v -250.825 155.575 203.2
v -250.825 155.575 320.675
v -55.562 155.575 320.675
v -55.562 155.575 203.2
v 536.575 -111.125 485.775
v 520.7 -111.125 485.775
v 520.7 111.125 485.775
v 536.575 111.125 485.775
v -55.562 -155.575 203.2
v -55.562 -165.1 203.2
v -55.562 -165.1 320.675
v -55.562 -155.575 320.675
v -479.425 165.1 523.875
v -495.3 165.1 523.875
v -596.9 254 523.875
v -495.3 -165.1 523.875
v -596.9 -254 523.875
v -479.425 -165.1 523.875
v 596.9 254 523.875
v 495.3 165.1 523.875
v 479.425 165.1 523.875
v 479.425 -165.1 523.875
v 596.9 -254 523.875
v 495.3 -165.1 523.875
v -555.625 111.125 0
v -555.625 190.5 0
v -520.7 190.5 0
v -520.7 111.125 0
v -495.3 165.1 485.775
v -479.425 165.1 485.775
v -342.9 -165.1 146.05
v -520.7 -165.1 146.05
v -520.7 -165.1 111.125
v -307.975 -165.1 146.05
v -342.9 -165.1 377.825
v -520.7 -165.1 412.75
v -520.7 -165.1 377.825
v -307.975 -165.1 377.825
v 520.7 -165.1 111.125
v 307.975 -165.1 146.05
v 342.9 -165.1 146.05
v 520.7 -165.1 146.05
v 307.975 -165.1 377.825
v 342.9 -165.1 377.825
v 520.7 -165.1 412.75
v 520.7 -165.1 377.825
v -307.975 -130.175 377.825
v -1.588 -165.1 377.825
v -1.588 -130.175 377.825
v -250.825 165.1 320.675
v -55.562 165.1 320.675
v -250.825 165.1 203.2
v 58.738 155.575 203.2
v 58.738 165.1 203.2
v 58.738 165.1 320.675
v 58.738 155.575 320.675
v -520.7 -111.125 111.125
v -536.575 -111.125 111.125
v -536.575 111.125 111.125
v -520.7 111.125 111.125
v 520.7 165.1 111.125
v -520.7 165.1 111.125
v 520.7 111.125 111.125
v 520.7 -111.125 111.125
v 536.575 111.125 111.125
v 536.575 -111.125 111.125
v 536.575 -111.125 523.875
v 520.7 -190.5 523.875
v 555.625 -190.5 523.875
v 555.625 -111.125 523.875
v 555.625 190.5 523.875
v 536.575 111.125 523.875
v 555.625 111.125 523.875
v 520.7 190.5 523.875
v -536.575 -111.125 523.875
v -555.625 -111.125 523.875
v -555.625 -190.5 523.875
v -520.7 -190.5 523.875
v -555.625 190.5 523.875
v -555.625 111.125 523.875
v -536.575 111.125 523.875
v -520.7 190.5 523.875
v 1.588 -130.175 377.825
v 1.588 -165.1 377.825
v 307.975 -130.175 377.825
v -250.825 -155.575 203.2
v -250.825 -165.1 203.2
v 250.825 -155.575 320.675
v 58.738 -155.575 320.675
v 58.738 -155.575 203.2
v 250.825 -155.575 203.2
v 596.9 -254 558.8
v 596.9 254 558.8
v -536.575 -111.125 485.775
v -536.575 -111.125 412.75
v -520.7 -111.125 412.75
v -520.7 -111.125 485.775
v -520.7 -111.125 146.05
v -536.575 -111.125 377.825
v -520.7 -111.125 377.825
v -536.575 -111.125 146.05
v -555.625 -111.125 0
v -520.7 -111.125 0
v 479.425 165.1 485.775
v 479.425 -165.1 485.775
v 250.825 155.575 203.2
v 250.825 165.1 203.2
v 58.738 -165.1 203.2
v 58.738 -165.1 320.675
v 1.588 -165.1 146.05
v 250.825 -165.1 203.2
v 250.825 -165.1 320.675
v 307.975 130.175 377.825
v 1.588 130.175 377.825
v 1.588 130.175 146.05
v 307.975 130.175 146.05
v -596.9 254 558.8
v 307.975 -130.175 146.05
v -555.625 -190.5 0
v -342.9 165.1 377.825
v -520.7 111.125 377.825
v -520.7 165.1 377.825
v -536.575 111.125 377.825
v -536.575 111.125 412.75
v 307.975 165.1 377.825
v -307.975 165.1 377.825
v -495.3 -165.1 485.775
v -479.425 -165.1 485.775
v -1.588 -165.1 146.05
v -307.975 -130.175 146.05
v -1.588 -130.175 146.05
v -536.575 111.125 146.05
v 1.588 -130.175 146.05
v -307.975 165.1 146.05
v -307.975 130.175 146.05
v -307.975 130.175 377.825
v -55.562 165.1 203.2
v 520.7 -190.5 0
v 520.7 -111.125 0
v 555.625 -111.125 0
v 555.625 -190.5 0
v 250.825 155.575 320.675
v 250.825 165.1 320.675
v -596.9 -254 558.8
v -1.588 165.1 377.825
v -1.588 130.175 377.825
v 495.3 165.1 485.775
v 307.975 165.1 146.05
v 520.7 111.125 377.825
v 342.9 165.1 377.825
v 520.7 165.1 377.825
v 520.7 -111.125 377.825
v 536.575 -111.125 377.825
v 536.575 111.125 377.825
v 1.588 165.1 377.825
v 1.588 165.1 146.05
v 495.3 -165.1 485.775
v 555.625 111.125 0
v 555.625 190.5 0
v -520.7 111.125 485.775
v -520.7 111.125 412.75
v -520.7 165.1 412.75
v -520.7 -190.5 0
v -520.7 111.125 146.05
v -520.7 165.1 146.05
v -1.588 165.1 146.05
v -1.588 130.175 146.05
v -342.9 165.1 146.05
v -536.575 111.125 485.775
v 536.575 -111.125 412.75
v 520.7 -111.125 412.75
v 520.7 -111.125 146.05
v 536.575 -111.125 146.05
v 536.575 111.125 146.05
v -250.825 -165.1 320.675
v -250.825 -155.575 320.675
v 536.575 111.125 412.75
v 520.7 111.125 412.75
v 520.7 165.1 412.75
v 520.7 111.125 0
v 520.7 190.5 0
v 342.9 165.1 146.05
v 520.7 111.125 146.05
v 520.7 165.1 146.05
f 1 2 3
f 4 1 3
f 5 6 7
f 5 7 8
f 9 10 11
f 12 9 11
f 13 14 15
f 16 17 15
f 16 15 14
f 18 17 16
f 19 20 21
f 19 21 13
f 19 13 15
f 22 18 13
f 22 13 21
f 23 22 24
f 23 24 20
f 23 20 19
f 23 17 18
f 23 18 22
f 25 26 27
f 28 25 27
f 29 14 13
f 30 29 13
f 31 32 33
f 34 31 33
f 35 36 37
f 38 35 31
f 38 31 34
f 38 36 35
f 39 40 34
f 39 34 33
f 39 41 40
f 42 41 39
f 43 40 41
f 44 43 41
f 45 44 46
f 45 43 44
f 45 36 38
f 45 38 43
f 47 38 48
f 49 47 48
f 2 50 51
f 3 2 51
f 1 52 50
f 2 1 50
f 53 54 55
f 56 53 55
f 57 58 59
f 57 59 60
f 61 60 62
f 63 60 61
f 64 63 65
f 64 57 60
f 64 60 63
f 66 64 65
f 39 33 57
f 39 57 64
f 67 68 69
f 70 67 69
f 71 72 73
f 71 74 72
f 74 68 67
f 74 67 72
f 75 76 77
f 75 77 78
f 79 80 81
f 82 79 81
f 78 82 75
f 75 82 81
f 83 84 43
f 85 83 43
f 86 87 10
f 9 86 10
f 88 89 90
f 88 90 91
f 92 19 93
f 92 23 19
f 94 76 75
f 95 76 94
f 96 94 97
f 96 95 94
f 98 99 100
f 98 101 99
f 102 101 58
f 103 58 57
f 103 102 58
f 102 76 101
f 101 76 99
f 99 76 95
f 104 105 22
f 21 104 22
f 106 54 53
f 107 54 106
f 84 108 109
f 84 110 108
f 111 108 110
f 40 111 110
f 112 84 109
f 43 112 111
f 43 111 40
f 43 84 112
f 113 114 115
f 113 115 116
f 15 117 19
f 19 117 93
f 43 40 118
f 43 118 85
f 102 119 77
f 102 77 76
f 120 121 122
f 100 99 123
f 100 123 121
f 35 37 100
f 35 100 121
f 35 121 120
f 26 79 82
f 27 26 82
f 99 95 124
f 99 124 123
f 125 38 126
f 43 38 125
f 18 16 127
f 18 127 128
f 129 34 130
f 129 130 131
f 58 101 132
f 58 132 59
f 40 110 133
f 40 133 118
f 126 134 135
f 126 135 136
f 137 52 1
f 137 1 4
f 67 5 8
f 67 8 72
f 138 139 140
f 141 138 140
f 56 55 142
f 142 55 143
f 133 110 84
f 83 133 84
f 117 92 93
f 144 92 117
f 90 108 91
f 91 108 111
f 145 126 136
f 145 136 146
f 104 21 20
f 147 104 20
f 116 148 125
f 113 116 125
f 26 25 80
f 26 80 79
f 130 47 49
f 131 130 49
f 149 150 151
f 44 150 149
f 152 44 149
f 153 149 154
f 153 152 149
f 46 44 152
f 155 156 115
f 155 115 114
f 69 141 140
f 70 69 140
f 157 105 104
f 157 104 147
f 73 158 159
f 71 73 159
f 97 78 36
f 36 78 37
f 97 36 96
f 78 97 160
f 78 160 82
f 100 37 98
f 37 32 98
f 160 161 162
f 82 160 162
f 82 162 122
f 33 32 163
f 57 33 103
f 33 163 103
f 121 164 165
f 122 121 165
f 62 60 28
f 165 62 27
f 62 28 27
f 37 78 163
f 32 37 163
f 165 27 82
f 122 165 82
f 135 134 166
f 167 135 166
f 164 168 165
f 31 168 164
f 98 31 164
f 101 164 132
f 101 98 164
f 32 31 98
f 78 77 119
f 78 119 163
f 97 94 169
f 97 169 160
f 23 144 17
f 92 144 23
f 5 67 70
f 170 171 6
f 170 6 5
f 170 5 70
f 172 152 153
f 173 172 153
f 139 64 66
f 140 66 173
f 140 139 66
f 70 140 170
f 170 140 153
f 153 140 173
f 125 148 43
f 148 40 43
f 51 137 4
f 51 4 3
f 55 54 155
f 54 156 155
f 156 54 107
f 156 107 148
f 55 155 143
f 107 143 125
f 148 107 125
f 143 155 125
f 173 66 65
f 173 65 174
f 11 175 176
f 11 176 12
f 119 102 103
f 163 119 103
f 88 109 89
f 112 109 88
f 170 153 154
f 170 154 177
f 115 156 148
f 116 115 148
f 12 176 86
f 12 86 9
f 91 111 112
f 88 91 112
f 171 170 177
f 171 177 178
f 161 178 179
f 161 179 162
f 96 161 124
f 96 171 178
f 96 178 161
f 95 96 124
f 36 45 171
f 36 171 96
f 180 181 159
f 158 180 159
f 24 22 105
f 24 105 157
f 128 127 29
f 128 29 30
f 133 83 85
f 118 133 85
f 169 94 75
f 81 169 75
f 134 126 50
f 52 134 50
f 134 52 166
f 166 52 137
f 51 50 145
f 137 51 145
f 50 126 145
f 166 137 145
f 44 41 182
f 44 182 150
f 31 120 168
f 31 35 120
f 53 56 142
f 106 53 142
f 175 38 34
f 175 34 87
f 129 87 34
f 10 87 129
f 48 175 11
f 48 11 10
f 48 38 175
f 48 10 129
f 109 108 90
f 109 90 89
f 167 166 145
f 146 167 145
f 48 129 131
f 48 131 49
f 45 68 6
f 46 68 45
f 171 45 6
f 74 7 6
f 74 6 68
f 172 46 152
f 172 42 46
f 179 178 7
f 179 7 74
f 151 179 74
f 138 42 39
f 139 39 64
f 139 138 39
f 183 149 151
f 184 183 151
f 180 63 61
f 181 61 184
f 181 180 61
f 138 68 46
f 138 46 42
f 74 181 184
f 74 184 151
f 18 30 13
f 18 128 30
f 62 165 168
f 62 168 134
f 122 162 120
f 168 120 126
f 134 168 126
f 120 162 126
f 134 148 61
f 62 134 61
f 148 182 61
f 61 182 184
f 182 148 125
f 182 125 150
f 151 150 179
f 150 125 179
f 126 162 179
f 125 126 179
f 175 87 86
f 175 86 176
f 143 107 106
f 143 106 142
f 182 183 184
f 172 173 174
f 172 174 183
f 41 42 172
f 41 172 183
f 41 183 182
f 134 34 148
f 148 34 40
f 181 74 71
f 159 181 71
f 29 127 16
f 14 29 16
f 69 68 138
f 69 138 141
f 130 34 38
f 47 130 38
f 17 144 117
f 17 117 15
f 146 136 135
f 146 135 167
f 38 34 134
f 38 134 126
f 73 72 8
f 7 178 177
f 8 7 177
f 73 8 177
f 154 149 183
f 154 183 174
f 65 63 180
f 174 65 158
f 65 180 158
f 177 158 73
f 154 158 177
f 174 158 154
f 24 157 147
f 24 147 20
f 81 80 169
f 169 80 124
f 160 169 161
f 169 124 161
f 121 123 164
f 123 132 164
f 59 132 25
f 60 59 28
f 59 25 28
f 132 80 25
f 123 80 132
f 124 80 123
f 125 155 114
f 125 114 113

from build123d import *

# Parameters (mm, degrees)
F1_DEPTH      = 254
F0_W          = 615.95
F0_H          = 231.775
F2_DEPTH      = 165.1
F2_DEPTH_BACK = 165.1
F0_W_2        = 15.875
F0_H_2        = 38.1
F3_W          = 34.925
F3_H          = 79.375
F4_DEPTH      = 523.875
F5_W          = 306.3875
F5_H          = 231.775
F5_W_2        = 195.2625
F5_H_2        = 117.475
F6_DEPTH      = 34.925
F5_W_3        = 192.0875
F7_DEPTH      = 9.525


with BuildPart() as f1:
    # F0 (on Front) → F1 (new body, symmetric)
    with BuildSketch(Plane.XZ):
        Polygon((596.9, 523.875), (596.9, 558.8), (-596.9, 558.8), (-596.9, 523.875), (-536.575, 523.875), (-520.7, 523.875), (-495.3, 523.875), (-479.425, 523.875), (479.425, 523.875), (495.3, 523.875), (520.7, 523.875), (536.575, 523.875), align=None)
    extrude(amount=F1_DEPTH, both=True)

    # F0 (on Front) → F2, piece 3 (join, two sides)
    with BuildSketch(Plane.XZ) as f2_3_sk:
        with Locations((487.3625, 504.825)):
            Rectangle(F0_W_2, F0_H_2)
        with Locations((-487.3625, 504.825)):
            Rectangle(F0_W_2, F0_H_2)
    extrude(amount=F2_DEPTH)
    extrude(f2_3_sk.sketch, amount=-F2_DEPTH_BACK)


with BuildPart() as f2:
    # F0 (on Front) → F2 (new body, two sides)
    with BuildSketch(Plane.XZ) as f2_sk:
        Polygon((536.575, 111.125), (536.575, 146.05), (342.9, 146.05), (342.9, 377.825), (536.575, 377.825), (536.575, 412.75), (-536.575, 412.75), (-536.575, 377.825), (-342.9, 377.825), (-342.9, 146.05), (-536.575, 146.05), (-536.575, 111.125), align=None)
        with Locations((0, 261.9375)):
            Rectangle(F0_W, F0_H, mode=Mode.SUBTRACT)
    extrude(amount=F2_DEPTH)
    extrude(f2_sk.sketch, amount=-F2_DEPTH_BACK)



with BuildPart() as f2b:
    # F0 (on Front) → F2, piece 2 (new body, two sides)
    with BuildSketch(Plane.XZ) as f2_2_sk:
        with Locations((528.6375, 504.825)):
            Rectangle(F0_W_2, F0_H_2)
    extrude(amount=F2_DEPTH)
    extrude(f2_2_sk.sketch, amount=-F2_DEPTH_BACK)


with BuildPart() as f2c:
    # F0 (on Front) → F2, piece 4 (new body, two sides)
    with BuildSketch(Plane.XZ) as f2_4_sk:
        with Locations((-528.6375, 504.825)):
            Rectangle(F0_W_2, F0_H_2)
    extrude(amount=F2_DEPTH)
    extrude(f2_4_sk.sketch, amount=-F2_DEPTH_BACK)


with BuildPart() as f2_1:
    add(f2.part)

    add(f2b.part)  # F4 merges F2b

    add(f2c.part)  # F4 merges F2c
    # F3 (on Top) → F4 (join, through all)
    with BuildSketch(Plane.XY):
        with Locations((-538.1625, 150.8125)):
            Rectangle(F3_W, F3_H)
        with Locations((-538.1625, -150.8125)):
            Rectangle(F3_W, F3_H)
        with Locations((538.1625, -150.8125)):
            Rectangle(F3_W, F3_H)
        with Locations((538.1625, 150.8125)):
            Rectangle(F3_W, F3_H)
    extrude(amount=F4_DEPTH)


with BuildPart() as f6:
    # F5 (on face) → F6 (new body)
    with BuildSketch(Plane.XZ.offset(165.1)):
        with Locations((-154.78125, 261.9375)):
            Rectangle(F5_W, F5_H)
        with Locations((-153.19375, 261.9375)):
            Rectangle(F5_W_2, F5_H_2, mode=Mode.SUBTRACT)
        with Locations((-153.19375, 261.9375)):
            Rectangle(F5_W_2, F5_H_2)
    extrude(amount=-F6_DEPTH)


with BuildPart() as f6b:
    # F5 (on face) → F6, piece 2 (new body)
    with BuildSketch(Plane.XZ.offset(165.1)):
        with Locations((154.78125, 261.9375)):
            Rectangle(F5_W, F5_H)
        with Locations((154.78125, 261.9375)):
            Rectangle(F5_W_3, F5_H_2, mode=Mode.SUBTRACT)
        with Locations((154.78125, 261.9375)):
            Rectangle(F5_W_3, F5_H_2)
    extrude(amount=-F6_DEPTH)


with BuildPart() as f7_tool:
    # F5 (on face) → F7 (new body)
    with BuildSketch(Plane.XZ.offset(165.1)):
        with Locations((-153.19375, 261.9375)):
            Rectangle(F5_W_2, F5_H_2)
        with Locations((154.78125, 261.9375)):
            Rectangle(F5_W_3, F5_H_2)
    extrude(amount=-F7_DEPTH)


with BuildPart() as f6_1:
    add(f6.part)

    # F7: cut by f7_tool
    add(f7_tool.part, mode=Mode.SUBTRACT)


with BuildPart() as f6b_1:
    add(f6b.part)

    # F7: cut by f7_tool
    add(f7_tool.part, mode=Mode.SUBTRACT)


with BuildPart() as f8_1:
    # F8: instance of F6
    add(f6_1.part.mirror(Plane.XZ))


with BuildPart() as f8_2:
    # F8: instance of F6b
    add(f6b_1.part.mirror(Plane.XZ))


solid = Compound([f1.part, f2_1.part, f6_1.part, f6b_1.part, f8_1.part, f8_2.part])
